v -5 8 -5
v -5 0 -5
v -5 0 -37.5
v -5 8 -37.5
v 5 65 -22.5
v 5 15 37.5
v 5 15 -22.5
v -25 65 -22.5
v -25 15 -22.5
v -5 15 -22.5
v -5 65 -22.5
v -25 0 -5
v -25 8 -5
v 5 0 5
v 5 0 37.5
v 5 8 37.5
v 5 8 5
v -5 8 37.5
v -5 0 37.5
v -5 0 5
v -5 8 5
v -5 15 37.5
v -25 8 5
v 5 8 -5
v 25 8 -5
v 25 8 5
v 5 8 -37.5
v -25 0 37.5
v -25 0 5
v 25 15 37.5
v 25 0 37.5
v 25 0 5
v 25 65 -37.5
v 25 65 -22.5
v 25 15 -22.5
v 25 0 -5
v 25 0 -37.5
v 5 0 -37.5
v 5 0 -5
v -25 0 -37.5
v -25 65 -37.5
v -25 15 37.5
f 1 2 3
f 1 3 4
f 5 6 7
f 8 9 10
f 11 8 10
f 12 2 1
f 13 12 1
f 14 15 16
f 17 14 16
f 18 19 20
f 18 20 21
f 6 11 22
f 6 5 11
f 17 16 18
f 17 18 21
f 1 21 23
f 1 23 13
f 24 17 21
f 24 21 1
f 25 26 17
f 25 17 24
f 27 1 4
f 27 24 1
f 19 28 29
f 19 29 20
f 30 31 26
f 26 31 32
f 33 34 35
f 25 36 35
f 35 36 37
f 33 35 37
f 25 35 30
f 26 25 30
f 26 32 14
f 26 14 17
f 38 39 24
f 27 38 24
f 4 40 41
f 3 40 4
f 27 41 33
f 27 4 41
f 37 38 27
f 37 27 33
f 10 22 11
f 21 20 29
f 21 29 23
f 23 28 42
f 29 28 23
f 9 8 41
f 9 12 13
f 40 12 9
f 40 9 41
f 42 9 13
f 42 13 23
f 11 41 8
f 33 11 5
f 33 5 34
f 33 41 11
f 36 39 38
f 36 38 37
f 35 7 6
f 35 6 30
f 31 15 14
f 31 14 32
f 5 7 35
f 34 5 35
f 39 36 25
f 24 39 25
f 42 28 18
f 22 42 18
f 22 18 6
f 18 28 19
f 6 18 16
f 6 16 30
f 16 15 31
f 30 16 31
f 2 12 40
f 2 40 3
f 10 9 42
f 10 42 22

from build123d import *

# Parameters (mm, degrees)
IZIM1_W                     = 50
IZIM1_H                     = 75
Y_KSEKLIK_EKSTR_ZYON1_DEPTH = 15
IZIM2_W                     = 50
IZIM2_H                     = 15
Y_KSEKLIK_EKSTR_ZYON2_DEPTH = 50
Y_KSEKLIK_EKSTR_ZYON3_DEPTH = 5
IZIM5_W                     = 10
IZIM5_H                     = 8
KES_EKSTR_ZYON1_DEPTH       = 76
IZIM6_W                     = 10
IZIM6_H                     = 8
KES_EKSTR_ZYON2_DEPTH       = 51


with BuildPart() as part:
    # Çizim1 → Yükseklik-Ekstrüzyon1 (new body)
    with BuildSketch(Plane(origin=(0, 0, 0), x_dir=(1, 0, 0), z_dir=(0, 1, 0))):
        Rectangle(IZIM1_W, IZIM1_H)
    extrude(amount=Y_KSEKLIK_EKSTR_ZYON1_DEPTH)

    # Çizim2 → Yükseklik-Ekstrüzyon2 (add)
    with BuildSketch(Plane(origin=(0, 15, 0), x_dir=(1, 0, 0), z_dir=(0, 1, 0))):
        with Locations((0, 30)):
            Rectangle(IZIM2_W, IZIM2_H)
    extrude(amount=Y_KSEKLIK_EKSTR_ZYON2_DEPTH)

    # Çizim4 → Yükseklik-Ekstrüzyon3 (add, symmetric)
    with BuildSketch(Plane(origin=(0, 0, 0), x_dir=(0, 0, -1), z_dir=(1, 0, 0))):
        Polygon((22.5, 65), (-37.5, 15), (22.5, 15), align=None)
    extrude(amount=Y_KSEKLIK_EKSTR_ZYON3_DEPTH, both=True)

    # Çizim5 → Kes-Ekstrüzyon1 (cut, through all)
    with BuildSketch(Plane.XY.offset(37.5)):
        with Locations((0, 4)):
            Rectangle(IZIM5_W, IZIM5_H)
    extrude(amount=-KES_EKSTR_ZYON1_DEPTH, mode=Mode.SUBTRACT)

    # Çizim6 → Kes-Ekstrüzyon2 (cut, through all)
    with BuildSketch(Plane(origin=(25, 0, 0), x_dir=(0, 0, -1), z_dir=(1, 0, 0))):
        with Locations((0, 4)):
            Rectangle(IZIM6_W, IZIM6_H)
    extrude(amount=-KES_EKSTR_ZYON2_DEPTH, mode=Mode.SUBTRACT)


solid = part.part
